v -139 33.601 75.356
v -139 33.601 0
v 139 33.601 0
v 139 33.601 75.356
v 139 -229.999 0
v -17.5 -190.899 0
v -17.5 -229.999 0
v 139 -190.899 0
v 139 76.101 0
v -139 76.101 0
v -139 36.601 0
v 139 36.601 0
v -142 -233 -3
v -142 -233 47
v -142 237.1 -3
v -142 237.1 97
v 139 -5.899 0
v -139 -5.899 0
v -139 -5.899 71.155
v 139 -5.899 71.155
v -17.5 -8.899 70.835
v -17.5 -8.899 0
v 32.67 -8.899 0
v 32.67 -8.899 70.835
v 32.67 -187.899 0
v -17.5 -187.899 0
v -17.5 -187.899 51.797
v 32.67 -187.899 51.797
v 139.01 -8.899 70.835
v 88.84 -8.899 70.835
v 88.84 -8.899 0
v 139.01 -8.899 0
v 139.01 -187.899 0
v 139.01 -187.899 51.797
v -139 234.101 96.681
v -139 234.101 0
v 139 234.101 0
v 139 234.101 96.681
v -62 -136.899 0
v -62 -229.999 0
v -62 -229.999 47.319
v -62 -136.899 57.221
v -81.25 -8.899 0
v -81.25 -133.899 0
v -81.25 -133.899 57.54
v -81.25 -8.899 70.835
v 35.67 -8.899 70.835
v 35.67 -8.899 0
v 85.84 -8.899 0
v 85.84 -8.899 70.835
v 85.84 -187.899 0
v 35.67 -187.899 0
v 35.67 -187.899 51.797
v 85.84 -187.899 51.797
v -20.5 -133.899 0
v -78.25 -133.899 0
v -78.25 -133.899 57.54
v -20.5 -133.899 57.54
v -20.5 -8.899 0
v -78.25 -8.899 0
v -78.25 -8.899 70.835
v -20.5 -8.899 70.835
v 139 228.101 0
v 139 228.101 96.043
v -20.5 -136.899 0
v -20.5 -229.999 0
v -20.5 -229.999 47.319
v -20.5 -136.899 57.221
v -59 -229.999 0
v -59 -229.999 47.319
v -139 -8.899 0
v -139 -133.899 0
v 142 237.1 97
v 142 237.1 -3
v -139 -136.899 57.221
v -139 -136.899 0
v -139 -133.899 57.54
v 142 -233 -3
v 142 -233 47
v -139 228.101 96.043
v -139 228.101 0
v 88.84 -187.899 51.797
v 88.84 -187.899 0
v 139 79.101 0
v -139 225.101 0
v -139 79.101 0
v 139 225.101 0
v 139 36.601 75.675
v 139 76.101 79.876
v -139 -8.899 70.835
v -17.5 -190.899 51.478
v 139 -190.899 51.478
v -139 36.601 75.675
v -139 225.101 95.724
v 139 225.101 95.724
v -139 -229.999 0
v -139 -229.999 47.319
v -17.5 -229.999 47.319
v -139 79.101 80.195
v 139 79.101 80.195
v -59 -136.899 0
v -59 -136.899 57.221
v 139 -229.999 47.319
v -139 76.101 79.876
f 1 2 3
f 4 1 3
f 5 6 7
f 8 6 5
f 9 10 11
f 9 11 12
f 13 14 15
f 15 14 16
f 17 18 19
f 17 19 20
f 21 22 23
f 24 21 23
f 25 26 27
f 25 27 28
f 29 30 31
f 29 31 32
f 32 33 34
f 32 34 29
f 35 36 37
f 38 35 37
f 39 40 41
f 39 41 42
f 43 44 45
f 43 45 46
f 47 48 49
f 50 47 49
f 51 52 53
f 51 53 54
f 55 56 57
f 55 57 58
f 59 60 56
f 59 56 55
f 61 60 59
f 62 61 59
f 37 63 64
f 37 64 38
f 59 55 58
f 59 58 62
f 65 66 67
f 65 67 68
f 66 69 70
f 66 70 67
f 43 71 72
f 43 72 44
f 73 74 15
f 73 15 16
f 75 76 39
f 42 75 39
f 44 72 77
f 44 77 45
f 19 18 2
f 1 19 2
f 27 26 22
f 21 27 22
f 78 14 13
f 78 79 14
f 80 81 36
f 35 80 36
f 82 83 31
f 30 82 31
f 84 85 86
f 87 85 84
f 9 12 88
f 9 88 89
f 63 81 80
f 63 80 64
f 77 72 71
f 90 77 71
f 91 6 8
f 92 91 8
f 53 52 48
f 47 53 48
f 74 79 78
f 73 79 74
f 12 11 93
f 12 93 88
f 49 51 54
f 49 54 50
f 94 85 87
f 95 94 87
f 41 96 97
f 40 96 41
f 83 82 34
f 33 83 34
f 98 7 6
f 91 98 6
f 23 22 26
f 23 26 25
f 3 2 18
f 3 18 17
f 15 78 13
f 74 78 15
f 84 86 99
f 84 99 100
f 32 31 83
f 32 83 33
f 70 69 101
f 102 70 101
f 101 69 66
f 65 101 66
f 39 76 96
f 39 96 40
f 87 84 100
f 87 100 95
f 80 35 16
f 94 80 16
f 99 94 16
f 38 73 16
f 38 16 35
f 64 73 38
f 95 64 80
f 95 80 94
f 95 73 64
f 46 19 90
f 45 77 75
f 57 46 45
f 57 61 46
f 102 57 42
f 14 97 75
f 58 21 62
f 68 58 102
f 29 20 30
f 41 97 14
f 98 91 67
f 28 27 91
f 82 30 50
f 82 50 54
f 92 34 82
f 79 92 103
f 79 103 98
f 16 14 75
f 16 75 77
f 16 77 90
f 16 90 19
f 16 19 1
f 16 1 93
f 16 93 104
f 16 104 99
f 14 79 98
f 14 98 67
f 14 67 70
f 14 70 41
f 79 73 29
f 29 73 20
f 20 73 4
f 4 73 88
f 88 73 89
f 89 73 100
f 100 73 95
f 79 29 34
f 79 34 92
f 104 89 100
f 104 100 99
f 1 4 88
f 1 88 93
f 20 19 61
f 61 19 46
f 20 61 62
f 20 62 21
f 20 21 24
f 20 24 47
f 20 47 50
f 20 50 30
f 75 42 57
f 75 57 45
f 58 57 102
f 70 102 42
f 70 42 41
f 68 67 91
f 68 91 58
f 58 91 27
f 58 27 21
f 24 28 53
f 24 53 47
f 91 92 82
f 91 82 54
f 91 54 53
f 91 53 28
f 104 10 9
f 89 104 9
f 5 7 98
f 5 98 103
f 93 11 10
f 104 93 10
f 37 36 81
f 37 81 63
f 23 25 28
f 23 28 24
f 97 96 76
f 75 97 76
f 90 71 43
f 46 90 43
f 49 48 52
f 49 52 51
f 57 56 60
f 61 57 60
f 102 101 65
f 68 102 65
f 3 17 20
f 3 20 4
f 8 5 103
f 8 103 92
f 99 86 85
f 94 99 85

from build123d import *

# Parameters (mm, degrees)
PAD_DEPTH     = 142
SKETCH001_W   = 278
SKETCH001_H   = 146
SKETCH001_H_2 = 39.5
SKETCH001_W_2 = 57.75
SKETCH001_H_3 = 125
SKETCH001_W_3 = 77
SKETCH001_H_4 = 93.1
SKETCH001_W_4 = 38.5
SKETCH001_W_5 = 50.17
SKETCH001_H_5 = 179
SKETCH001_W_6 = 156.5
SKETCH001_H_6 = 39.1
SKETCH001_H_7 = 6
POCKET_DEPTH  = 100


with BuildPart() as part:
    # Sketch → Pad (new body, symmetric)
    with BuildSketch(Plane.YZ):
        Polygon((-233, 47), (-233, -3), (237.1, -3), (237.1, 97), align=None)
    extrude(amount=PAD_DEPTH, both=True)

    # Sketch001 → Pocket (cut)
    with BuildSketch(Plane.XY):
        with Locations((0, 152.101043)):
            Rectangle(SKETCH001_W, SKETCH001_H)
        with Locations((0, 56.351043)):
            Rectangle(SKETCH001_W, SKETCH001_H_2)
        with Locations((0, 13.851043)):
            Rectangle(SKETCH001_W, SKETCH001_H_2)
        with Locations((-110.125, -71.398957)):
            Rectangle(SKETCH001_W_2, SKETCH001_H_3)
        with Locations((-49.375, -71.398957)):
            Rectangle(SKETCH001_W_2, SKETCH001_H_3)
        with Locations((-100.5, -183.448957)):
            Rectangle(SKETCH001_W_3, SKETCH001_H_4)
        with Locations((-39.75, -183.448957)):
            Rectangle(SKETCH001_W_4, SKETCH001_H_4)
        with Locations((7.585, -98.398957)):
            Rectangle(SKETCH001_W_5, SKETCH001_H_5)
        with Locations((60.755, -98.398957)):
            Rectangle(SKETCH001_W_5, SKETCH001_H_5)
        with Locations((113.925, -98.398957)):
            Rectangle(SKETCH001_W_5, SKETCH001_H_5)
        with Locations((60.75, -210.448957)):
            Rectangle(SKETCH001_W_6, SKETCH001_H_6)
        with Locations((0, 231.101043)):
            Rectangle(SKETCH001_W, SKETCH001_H_7)
    extrude(amount=POCKET_DEPTH, mode=Mode.SUBTRACT)


solid = part.part
